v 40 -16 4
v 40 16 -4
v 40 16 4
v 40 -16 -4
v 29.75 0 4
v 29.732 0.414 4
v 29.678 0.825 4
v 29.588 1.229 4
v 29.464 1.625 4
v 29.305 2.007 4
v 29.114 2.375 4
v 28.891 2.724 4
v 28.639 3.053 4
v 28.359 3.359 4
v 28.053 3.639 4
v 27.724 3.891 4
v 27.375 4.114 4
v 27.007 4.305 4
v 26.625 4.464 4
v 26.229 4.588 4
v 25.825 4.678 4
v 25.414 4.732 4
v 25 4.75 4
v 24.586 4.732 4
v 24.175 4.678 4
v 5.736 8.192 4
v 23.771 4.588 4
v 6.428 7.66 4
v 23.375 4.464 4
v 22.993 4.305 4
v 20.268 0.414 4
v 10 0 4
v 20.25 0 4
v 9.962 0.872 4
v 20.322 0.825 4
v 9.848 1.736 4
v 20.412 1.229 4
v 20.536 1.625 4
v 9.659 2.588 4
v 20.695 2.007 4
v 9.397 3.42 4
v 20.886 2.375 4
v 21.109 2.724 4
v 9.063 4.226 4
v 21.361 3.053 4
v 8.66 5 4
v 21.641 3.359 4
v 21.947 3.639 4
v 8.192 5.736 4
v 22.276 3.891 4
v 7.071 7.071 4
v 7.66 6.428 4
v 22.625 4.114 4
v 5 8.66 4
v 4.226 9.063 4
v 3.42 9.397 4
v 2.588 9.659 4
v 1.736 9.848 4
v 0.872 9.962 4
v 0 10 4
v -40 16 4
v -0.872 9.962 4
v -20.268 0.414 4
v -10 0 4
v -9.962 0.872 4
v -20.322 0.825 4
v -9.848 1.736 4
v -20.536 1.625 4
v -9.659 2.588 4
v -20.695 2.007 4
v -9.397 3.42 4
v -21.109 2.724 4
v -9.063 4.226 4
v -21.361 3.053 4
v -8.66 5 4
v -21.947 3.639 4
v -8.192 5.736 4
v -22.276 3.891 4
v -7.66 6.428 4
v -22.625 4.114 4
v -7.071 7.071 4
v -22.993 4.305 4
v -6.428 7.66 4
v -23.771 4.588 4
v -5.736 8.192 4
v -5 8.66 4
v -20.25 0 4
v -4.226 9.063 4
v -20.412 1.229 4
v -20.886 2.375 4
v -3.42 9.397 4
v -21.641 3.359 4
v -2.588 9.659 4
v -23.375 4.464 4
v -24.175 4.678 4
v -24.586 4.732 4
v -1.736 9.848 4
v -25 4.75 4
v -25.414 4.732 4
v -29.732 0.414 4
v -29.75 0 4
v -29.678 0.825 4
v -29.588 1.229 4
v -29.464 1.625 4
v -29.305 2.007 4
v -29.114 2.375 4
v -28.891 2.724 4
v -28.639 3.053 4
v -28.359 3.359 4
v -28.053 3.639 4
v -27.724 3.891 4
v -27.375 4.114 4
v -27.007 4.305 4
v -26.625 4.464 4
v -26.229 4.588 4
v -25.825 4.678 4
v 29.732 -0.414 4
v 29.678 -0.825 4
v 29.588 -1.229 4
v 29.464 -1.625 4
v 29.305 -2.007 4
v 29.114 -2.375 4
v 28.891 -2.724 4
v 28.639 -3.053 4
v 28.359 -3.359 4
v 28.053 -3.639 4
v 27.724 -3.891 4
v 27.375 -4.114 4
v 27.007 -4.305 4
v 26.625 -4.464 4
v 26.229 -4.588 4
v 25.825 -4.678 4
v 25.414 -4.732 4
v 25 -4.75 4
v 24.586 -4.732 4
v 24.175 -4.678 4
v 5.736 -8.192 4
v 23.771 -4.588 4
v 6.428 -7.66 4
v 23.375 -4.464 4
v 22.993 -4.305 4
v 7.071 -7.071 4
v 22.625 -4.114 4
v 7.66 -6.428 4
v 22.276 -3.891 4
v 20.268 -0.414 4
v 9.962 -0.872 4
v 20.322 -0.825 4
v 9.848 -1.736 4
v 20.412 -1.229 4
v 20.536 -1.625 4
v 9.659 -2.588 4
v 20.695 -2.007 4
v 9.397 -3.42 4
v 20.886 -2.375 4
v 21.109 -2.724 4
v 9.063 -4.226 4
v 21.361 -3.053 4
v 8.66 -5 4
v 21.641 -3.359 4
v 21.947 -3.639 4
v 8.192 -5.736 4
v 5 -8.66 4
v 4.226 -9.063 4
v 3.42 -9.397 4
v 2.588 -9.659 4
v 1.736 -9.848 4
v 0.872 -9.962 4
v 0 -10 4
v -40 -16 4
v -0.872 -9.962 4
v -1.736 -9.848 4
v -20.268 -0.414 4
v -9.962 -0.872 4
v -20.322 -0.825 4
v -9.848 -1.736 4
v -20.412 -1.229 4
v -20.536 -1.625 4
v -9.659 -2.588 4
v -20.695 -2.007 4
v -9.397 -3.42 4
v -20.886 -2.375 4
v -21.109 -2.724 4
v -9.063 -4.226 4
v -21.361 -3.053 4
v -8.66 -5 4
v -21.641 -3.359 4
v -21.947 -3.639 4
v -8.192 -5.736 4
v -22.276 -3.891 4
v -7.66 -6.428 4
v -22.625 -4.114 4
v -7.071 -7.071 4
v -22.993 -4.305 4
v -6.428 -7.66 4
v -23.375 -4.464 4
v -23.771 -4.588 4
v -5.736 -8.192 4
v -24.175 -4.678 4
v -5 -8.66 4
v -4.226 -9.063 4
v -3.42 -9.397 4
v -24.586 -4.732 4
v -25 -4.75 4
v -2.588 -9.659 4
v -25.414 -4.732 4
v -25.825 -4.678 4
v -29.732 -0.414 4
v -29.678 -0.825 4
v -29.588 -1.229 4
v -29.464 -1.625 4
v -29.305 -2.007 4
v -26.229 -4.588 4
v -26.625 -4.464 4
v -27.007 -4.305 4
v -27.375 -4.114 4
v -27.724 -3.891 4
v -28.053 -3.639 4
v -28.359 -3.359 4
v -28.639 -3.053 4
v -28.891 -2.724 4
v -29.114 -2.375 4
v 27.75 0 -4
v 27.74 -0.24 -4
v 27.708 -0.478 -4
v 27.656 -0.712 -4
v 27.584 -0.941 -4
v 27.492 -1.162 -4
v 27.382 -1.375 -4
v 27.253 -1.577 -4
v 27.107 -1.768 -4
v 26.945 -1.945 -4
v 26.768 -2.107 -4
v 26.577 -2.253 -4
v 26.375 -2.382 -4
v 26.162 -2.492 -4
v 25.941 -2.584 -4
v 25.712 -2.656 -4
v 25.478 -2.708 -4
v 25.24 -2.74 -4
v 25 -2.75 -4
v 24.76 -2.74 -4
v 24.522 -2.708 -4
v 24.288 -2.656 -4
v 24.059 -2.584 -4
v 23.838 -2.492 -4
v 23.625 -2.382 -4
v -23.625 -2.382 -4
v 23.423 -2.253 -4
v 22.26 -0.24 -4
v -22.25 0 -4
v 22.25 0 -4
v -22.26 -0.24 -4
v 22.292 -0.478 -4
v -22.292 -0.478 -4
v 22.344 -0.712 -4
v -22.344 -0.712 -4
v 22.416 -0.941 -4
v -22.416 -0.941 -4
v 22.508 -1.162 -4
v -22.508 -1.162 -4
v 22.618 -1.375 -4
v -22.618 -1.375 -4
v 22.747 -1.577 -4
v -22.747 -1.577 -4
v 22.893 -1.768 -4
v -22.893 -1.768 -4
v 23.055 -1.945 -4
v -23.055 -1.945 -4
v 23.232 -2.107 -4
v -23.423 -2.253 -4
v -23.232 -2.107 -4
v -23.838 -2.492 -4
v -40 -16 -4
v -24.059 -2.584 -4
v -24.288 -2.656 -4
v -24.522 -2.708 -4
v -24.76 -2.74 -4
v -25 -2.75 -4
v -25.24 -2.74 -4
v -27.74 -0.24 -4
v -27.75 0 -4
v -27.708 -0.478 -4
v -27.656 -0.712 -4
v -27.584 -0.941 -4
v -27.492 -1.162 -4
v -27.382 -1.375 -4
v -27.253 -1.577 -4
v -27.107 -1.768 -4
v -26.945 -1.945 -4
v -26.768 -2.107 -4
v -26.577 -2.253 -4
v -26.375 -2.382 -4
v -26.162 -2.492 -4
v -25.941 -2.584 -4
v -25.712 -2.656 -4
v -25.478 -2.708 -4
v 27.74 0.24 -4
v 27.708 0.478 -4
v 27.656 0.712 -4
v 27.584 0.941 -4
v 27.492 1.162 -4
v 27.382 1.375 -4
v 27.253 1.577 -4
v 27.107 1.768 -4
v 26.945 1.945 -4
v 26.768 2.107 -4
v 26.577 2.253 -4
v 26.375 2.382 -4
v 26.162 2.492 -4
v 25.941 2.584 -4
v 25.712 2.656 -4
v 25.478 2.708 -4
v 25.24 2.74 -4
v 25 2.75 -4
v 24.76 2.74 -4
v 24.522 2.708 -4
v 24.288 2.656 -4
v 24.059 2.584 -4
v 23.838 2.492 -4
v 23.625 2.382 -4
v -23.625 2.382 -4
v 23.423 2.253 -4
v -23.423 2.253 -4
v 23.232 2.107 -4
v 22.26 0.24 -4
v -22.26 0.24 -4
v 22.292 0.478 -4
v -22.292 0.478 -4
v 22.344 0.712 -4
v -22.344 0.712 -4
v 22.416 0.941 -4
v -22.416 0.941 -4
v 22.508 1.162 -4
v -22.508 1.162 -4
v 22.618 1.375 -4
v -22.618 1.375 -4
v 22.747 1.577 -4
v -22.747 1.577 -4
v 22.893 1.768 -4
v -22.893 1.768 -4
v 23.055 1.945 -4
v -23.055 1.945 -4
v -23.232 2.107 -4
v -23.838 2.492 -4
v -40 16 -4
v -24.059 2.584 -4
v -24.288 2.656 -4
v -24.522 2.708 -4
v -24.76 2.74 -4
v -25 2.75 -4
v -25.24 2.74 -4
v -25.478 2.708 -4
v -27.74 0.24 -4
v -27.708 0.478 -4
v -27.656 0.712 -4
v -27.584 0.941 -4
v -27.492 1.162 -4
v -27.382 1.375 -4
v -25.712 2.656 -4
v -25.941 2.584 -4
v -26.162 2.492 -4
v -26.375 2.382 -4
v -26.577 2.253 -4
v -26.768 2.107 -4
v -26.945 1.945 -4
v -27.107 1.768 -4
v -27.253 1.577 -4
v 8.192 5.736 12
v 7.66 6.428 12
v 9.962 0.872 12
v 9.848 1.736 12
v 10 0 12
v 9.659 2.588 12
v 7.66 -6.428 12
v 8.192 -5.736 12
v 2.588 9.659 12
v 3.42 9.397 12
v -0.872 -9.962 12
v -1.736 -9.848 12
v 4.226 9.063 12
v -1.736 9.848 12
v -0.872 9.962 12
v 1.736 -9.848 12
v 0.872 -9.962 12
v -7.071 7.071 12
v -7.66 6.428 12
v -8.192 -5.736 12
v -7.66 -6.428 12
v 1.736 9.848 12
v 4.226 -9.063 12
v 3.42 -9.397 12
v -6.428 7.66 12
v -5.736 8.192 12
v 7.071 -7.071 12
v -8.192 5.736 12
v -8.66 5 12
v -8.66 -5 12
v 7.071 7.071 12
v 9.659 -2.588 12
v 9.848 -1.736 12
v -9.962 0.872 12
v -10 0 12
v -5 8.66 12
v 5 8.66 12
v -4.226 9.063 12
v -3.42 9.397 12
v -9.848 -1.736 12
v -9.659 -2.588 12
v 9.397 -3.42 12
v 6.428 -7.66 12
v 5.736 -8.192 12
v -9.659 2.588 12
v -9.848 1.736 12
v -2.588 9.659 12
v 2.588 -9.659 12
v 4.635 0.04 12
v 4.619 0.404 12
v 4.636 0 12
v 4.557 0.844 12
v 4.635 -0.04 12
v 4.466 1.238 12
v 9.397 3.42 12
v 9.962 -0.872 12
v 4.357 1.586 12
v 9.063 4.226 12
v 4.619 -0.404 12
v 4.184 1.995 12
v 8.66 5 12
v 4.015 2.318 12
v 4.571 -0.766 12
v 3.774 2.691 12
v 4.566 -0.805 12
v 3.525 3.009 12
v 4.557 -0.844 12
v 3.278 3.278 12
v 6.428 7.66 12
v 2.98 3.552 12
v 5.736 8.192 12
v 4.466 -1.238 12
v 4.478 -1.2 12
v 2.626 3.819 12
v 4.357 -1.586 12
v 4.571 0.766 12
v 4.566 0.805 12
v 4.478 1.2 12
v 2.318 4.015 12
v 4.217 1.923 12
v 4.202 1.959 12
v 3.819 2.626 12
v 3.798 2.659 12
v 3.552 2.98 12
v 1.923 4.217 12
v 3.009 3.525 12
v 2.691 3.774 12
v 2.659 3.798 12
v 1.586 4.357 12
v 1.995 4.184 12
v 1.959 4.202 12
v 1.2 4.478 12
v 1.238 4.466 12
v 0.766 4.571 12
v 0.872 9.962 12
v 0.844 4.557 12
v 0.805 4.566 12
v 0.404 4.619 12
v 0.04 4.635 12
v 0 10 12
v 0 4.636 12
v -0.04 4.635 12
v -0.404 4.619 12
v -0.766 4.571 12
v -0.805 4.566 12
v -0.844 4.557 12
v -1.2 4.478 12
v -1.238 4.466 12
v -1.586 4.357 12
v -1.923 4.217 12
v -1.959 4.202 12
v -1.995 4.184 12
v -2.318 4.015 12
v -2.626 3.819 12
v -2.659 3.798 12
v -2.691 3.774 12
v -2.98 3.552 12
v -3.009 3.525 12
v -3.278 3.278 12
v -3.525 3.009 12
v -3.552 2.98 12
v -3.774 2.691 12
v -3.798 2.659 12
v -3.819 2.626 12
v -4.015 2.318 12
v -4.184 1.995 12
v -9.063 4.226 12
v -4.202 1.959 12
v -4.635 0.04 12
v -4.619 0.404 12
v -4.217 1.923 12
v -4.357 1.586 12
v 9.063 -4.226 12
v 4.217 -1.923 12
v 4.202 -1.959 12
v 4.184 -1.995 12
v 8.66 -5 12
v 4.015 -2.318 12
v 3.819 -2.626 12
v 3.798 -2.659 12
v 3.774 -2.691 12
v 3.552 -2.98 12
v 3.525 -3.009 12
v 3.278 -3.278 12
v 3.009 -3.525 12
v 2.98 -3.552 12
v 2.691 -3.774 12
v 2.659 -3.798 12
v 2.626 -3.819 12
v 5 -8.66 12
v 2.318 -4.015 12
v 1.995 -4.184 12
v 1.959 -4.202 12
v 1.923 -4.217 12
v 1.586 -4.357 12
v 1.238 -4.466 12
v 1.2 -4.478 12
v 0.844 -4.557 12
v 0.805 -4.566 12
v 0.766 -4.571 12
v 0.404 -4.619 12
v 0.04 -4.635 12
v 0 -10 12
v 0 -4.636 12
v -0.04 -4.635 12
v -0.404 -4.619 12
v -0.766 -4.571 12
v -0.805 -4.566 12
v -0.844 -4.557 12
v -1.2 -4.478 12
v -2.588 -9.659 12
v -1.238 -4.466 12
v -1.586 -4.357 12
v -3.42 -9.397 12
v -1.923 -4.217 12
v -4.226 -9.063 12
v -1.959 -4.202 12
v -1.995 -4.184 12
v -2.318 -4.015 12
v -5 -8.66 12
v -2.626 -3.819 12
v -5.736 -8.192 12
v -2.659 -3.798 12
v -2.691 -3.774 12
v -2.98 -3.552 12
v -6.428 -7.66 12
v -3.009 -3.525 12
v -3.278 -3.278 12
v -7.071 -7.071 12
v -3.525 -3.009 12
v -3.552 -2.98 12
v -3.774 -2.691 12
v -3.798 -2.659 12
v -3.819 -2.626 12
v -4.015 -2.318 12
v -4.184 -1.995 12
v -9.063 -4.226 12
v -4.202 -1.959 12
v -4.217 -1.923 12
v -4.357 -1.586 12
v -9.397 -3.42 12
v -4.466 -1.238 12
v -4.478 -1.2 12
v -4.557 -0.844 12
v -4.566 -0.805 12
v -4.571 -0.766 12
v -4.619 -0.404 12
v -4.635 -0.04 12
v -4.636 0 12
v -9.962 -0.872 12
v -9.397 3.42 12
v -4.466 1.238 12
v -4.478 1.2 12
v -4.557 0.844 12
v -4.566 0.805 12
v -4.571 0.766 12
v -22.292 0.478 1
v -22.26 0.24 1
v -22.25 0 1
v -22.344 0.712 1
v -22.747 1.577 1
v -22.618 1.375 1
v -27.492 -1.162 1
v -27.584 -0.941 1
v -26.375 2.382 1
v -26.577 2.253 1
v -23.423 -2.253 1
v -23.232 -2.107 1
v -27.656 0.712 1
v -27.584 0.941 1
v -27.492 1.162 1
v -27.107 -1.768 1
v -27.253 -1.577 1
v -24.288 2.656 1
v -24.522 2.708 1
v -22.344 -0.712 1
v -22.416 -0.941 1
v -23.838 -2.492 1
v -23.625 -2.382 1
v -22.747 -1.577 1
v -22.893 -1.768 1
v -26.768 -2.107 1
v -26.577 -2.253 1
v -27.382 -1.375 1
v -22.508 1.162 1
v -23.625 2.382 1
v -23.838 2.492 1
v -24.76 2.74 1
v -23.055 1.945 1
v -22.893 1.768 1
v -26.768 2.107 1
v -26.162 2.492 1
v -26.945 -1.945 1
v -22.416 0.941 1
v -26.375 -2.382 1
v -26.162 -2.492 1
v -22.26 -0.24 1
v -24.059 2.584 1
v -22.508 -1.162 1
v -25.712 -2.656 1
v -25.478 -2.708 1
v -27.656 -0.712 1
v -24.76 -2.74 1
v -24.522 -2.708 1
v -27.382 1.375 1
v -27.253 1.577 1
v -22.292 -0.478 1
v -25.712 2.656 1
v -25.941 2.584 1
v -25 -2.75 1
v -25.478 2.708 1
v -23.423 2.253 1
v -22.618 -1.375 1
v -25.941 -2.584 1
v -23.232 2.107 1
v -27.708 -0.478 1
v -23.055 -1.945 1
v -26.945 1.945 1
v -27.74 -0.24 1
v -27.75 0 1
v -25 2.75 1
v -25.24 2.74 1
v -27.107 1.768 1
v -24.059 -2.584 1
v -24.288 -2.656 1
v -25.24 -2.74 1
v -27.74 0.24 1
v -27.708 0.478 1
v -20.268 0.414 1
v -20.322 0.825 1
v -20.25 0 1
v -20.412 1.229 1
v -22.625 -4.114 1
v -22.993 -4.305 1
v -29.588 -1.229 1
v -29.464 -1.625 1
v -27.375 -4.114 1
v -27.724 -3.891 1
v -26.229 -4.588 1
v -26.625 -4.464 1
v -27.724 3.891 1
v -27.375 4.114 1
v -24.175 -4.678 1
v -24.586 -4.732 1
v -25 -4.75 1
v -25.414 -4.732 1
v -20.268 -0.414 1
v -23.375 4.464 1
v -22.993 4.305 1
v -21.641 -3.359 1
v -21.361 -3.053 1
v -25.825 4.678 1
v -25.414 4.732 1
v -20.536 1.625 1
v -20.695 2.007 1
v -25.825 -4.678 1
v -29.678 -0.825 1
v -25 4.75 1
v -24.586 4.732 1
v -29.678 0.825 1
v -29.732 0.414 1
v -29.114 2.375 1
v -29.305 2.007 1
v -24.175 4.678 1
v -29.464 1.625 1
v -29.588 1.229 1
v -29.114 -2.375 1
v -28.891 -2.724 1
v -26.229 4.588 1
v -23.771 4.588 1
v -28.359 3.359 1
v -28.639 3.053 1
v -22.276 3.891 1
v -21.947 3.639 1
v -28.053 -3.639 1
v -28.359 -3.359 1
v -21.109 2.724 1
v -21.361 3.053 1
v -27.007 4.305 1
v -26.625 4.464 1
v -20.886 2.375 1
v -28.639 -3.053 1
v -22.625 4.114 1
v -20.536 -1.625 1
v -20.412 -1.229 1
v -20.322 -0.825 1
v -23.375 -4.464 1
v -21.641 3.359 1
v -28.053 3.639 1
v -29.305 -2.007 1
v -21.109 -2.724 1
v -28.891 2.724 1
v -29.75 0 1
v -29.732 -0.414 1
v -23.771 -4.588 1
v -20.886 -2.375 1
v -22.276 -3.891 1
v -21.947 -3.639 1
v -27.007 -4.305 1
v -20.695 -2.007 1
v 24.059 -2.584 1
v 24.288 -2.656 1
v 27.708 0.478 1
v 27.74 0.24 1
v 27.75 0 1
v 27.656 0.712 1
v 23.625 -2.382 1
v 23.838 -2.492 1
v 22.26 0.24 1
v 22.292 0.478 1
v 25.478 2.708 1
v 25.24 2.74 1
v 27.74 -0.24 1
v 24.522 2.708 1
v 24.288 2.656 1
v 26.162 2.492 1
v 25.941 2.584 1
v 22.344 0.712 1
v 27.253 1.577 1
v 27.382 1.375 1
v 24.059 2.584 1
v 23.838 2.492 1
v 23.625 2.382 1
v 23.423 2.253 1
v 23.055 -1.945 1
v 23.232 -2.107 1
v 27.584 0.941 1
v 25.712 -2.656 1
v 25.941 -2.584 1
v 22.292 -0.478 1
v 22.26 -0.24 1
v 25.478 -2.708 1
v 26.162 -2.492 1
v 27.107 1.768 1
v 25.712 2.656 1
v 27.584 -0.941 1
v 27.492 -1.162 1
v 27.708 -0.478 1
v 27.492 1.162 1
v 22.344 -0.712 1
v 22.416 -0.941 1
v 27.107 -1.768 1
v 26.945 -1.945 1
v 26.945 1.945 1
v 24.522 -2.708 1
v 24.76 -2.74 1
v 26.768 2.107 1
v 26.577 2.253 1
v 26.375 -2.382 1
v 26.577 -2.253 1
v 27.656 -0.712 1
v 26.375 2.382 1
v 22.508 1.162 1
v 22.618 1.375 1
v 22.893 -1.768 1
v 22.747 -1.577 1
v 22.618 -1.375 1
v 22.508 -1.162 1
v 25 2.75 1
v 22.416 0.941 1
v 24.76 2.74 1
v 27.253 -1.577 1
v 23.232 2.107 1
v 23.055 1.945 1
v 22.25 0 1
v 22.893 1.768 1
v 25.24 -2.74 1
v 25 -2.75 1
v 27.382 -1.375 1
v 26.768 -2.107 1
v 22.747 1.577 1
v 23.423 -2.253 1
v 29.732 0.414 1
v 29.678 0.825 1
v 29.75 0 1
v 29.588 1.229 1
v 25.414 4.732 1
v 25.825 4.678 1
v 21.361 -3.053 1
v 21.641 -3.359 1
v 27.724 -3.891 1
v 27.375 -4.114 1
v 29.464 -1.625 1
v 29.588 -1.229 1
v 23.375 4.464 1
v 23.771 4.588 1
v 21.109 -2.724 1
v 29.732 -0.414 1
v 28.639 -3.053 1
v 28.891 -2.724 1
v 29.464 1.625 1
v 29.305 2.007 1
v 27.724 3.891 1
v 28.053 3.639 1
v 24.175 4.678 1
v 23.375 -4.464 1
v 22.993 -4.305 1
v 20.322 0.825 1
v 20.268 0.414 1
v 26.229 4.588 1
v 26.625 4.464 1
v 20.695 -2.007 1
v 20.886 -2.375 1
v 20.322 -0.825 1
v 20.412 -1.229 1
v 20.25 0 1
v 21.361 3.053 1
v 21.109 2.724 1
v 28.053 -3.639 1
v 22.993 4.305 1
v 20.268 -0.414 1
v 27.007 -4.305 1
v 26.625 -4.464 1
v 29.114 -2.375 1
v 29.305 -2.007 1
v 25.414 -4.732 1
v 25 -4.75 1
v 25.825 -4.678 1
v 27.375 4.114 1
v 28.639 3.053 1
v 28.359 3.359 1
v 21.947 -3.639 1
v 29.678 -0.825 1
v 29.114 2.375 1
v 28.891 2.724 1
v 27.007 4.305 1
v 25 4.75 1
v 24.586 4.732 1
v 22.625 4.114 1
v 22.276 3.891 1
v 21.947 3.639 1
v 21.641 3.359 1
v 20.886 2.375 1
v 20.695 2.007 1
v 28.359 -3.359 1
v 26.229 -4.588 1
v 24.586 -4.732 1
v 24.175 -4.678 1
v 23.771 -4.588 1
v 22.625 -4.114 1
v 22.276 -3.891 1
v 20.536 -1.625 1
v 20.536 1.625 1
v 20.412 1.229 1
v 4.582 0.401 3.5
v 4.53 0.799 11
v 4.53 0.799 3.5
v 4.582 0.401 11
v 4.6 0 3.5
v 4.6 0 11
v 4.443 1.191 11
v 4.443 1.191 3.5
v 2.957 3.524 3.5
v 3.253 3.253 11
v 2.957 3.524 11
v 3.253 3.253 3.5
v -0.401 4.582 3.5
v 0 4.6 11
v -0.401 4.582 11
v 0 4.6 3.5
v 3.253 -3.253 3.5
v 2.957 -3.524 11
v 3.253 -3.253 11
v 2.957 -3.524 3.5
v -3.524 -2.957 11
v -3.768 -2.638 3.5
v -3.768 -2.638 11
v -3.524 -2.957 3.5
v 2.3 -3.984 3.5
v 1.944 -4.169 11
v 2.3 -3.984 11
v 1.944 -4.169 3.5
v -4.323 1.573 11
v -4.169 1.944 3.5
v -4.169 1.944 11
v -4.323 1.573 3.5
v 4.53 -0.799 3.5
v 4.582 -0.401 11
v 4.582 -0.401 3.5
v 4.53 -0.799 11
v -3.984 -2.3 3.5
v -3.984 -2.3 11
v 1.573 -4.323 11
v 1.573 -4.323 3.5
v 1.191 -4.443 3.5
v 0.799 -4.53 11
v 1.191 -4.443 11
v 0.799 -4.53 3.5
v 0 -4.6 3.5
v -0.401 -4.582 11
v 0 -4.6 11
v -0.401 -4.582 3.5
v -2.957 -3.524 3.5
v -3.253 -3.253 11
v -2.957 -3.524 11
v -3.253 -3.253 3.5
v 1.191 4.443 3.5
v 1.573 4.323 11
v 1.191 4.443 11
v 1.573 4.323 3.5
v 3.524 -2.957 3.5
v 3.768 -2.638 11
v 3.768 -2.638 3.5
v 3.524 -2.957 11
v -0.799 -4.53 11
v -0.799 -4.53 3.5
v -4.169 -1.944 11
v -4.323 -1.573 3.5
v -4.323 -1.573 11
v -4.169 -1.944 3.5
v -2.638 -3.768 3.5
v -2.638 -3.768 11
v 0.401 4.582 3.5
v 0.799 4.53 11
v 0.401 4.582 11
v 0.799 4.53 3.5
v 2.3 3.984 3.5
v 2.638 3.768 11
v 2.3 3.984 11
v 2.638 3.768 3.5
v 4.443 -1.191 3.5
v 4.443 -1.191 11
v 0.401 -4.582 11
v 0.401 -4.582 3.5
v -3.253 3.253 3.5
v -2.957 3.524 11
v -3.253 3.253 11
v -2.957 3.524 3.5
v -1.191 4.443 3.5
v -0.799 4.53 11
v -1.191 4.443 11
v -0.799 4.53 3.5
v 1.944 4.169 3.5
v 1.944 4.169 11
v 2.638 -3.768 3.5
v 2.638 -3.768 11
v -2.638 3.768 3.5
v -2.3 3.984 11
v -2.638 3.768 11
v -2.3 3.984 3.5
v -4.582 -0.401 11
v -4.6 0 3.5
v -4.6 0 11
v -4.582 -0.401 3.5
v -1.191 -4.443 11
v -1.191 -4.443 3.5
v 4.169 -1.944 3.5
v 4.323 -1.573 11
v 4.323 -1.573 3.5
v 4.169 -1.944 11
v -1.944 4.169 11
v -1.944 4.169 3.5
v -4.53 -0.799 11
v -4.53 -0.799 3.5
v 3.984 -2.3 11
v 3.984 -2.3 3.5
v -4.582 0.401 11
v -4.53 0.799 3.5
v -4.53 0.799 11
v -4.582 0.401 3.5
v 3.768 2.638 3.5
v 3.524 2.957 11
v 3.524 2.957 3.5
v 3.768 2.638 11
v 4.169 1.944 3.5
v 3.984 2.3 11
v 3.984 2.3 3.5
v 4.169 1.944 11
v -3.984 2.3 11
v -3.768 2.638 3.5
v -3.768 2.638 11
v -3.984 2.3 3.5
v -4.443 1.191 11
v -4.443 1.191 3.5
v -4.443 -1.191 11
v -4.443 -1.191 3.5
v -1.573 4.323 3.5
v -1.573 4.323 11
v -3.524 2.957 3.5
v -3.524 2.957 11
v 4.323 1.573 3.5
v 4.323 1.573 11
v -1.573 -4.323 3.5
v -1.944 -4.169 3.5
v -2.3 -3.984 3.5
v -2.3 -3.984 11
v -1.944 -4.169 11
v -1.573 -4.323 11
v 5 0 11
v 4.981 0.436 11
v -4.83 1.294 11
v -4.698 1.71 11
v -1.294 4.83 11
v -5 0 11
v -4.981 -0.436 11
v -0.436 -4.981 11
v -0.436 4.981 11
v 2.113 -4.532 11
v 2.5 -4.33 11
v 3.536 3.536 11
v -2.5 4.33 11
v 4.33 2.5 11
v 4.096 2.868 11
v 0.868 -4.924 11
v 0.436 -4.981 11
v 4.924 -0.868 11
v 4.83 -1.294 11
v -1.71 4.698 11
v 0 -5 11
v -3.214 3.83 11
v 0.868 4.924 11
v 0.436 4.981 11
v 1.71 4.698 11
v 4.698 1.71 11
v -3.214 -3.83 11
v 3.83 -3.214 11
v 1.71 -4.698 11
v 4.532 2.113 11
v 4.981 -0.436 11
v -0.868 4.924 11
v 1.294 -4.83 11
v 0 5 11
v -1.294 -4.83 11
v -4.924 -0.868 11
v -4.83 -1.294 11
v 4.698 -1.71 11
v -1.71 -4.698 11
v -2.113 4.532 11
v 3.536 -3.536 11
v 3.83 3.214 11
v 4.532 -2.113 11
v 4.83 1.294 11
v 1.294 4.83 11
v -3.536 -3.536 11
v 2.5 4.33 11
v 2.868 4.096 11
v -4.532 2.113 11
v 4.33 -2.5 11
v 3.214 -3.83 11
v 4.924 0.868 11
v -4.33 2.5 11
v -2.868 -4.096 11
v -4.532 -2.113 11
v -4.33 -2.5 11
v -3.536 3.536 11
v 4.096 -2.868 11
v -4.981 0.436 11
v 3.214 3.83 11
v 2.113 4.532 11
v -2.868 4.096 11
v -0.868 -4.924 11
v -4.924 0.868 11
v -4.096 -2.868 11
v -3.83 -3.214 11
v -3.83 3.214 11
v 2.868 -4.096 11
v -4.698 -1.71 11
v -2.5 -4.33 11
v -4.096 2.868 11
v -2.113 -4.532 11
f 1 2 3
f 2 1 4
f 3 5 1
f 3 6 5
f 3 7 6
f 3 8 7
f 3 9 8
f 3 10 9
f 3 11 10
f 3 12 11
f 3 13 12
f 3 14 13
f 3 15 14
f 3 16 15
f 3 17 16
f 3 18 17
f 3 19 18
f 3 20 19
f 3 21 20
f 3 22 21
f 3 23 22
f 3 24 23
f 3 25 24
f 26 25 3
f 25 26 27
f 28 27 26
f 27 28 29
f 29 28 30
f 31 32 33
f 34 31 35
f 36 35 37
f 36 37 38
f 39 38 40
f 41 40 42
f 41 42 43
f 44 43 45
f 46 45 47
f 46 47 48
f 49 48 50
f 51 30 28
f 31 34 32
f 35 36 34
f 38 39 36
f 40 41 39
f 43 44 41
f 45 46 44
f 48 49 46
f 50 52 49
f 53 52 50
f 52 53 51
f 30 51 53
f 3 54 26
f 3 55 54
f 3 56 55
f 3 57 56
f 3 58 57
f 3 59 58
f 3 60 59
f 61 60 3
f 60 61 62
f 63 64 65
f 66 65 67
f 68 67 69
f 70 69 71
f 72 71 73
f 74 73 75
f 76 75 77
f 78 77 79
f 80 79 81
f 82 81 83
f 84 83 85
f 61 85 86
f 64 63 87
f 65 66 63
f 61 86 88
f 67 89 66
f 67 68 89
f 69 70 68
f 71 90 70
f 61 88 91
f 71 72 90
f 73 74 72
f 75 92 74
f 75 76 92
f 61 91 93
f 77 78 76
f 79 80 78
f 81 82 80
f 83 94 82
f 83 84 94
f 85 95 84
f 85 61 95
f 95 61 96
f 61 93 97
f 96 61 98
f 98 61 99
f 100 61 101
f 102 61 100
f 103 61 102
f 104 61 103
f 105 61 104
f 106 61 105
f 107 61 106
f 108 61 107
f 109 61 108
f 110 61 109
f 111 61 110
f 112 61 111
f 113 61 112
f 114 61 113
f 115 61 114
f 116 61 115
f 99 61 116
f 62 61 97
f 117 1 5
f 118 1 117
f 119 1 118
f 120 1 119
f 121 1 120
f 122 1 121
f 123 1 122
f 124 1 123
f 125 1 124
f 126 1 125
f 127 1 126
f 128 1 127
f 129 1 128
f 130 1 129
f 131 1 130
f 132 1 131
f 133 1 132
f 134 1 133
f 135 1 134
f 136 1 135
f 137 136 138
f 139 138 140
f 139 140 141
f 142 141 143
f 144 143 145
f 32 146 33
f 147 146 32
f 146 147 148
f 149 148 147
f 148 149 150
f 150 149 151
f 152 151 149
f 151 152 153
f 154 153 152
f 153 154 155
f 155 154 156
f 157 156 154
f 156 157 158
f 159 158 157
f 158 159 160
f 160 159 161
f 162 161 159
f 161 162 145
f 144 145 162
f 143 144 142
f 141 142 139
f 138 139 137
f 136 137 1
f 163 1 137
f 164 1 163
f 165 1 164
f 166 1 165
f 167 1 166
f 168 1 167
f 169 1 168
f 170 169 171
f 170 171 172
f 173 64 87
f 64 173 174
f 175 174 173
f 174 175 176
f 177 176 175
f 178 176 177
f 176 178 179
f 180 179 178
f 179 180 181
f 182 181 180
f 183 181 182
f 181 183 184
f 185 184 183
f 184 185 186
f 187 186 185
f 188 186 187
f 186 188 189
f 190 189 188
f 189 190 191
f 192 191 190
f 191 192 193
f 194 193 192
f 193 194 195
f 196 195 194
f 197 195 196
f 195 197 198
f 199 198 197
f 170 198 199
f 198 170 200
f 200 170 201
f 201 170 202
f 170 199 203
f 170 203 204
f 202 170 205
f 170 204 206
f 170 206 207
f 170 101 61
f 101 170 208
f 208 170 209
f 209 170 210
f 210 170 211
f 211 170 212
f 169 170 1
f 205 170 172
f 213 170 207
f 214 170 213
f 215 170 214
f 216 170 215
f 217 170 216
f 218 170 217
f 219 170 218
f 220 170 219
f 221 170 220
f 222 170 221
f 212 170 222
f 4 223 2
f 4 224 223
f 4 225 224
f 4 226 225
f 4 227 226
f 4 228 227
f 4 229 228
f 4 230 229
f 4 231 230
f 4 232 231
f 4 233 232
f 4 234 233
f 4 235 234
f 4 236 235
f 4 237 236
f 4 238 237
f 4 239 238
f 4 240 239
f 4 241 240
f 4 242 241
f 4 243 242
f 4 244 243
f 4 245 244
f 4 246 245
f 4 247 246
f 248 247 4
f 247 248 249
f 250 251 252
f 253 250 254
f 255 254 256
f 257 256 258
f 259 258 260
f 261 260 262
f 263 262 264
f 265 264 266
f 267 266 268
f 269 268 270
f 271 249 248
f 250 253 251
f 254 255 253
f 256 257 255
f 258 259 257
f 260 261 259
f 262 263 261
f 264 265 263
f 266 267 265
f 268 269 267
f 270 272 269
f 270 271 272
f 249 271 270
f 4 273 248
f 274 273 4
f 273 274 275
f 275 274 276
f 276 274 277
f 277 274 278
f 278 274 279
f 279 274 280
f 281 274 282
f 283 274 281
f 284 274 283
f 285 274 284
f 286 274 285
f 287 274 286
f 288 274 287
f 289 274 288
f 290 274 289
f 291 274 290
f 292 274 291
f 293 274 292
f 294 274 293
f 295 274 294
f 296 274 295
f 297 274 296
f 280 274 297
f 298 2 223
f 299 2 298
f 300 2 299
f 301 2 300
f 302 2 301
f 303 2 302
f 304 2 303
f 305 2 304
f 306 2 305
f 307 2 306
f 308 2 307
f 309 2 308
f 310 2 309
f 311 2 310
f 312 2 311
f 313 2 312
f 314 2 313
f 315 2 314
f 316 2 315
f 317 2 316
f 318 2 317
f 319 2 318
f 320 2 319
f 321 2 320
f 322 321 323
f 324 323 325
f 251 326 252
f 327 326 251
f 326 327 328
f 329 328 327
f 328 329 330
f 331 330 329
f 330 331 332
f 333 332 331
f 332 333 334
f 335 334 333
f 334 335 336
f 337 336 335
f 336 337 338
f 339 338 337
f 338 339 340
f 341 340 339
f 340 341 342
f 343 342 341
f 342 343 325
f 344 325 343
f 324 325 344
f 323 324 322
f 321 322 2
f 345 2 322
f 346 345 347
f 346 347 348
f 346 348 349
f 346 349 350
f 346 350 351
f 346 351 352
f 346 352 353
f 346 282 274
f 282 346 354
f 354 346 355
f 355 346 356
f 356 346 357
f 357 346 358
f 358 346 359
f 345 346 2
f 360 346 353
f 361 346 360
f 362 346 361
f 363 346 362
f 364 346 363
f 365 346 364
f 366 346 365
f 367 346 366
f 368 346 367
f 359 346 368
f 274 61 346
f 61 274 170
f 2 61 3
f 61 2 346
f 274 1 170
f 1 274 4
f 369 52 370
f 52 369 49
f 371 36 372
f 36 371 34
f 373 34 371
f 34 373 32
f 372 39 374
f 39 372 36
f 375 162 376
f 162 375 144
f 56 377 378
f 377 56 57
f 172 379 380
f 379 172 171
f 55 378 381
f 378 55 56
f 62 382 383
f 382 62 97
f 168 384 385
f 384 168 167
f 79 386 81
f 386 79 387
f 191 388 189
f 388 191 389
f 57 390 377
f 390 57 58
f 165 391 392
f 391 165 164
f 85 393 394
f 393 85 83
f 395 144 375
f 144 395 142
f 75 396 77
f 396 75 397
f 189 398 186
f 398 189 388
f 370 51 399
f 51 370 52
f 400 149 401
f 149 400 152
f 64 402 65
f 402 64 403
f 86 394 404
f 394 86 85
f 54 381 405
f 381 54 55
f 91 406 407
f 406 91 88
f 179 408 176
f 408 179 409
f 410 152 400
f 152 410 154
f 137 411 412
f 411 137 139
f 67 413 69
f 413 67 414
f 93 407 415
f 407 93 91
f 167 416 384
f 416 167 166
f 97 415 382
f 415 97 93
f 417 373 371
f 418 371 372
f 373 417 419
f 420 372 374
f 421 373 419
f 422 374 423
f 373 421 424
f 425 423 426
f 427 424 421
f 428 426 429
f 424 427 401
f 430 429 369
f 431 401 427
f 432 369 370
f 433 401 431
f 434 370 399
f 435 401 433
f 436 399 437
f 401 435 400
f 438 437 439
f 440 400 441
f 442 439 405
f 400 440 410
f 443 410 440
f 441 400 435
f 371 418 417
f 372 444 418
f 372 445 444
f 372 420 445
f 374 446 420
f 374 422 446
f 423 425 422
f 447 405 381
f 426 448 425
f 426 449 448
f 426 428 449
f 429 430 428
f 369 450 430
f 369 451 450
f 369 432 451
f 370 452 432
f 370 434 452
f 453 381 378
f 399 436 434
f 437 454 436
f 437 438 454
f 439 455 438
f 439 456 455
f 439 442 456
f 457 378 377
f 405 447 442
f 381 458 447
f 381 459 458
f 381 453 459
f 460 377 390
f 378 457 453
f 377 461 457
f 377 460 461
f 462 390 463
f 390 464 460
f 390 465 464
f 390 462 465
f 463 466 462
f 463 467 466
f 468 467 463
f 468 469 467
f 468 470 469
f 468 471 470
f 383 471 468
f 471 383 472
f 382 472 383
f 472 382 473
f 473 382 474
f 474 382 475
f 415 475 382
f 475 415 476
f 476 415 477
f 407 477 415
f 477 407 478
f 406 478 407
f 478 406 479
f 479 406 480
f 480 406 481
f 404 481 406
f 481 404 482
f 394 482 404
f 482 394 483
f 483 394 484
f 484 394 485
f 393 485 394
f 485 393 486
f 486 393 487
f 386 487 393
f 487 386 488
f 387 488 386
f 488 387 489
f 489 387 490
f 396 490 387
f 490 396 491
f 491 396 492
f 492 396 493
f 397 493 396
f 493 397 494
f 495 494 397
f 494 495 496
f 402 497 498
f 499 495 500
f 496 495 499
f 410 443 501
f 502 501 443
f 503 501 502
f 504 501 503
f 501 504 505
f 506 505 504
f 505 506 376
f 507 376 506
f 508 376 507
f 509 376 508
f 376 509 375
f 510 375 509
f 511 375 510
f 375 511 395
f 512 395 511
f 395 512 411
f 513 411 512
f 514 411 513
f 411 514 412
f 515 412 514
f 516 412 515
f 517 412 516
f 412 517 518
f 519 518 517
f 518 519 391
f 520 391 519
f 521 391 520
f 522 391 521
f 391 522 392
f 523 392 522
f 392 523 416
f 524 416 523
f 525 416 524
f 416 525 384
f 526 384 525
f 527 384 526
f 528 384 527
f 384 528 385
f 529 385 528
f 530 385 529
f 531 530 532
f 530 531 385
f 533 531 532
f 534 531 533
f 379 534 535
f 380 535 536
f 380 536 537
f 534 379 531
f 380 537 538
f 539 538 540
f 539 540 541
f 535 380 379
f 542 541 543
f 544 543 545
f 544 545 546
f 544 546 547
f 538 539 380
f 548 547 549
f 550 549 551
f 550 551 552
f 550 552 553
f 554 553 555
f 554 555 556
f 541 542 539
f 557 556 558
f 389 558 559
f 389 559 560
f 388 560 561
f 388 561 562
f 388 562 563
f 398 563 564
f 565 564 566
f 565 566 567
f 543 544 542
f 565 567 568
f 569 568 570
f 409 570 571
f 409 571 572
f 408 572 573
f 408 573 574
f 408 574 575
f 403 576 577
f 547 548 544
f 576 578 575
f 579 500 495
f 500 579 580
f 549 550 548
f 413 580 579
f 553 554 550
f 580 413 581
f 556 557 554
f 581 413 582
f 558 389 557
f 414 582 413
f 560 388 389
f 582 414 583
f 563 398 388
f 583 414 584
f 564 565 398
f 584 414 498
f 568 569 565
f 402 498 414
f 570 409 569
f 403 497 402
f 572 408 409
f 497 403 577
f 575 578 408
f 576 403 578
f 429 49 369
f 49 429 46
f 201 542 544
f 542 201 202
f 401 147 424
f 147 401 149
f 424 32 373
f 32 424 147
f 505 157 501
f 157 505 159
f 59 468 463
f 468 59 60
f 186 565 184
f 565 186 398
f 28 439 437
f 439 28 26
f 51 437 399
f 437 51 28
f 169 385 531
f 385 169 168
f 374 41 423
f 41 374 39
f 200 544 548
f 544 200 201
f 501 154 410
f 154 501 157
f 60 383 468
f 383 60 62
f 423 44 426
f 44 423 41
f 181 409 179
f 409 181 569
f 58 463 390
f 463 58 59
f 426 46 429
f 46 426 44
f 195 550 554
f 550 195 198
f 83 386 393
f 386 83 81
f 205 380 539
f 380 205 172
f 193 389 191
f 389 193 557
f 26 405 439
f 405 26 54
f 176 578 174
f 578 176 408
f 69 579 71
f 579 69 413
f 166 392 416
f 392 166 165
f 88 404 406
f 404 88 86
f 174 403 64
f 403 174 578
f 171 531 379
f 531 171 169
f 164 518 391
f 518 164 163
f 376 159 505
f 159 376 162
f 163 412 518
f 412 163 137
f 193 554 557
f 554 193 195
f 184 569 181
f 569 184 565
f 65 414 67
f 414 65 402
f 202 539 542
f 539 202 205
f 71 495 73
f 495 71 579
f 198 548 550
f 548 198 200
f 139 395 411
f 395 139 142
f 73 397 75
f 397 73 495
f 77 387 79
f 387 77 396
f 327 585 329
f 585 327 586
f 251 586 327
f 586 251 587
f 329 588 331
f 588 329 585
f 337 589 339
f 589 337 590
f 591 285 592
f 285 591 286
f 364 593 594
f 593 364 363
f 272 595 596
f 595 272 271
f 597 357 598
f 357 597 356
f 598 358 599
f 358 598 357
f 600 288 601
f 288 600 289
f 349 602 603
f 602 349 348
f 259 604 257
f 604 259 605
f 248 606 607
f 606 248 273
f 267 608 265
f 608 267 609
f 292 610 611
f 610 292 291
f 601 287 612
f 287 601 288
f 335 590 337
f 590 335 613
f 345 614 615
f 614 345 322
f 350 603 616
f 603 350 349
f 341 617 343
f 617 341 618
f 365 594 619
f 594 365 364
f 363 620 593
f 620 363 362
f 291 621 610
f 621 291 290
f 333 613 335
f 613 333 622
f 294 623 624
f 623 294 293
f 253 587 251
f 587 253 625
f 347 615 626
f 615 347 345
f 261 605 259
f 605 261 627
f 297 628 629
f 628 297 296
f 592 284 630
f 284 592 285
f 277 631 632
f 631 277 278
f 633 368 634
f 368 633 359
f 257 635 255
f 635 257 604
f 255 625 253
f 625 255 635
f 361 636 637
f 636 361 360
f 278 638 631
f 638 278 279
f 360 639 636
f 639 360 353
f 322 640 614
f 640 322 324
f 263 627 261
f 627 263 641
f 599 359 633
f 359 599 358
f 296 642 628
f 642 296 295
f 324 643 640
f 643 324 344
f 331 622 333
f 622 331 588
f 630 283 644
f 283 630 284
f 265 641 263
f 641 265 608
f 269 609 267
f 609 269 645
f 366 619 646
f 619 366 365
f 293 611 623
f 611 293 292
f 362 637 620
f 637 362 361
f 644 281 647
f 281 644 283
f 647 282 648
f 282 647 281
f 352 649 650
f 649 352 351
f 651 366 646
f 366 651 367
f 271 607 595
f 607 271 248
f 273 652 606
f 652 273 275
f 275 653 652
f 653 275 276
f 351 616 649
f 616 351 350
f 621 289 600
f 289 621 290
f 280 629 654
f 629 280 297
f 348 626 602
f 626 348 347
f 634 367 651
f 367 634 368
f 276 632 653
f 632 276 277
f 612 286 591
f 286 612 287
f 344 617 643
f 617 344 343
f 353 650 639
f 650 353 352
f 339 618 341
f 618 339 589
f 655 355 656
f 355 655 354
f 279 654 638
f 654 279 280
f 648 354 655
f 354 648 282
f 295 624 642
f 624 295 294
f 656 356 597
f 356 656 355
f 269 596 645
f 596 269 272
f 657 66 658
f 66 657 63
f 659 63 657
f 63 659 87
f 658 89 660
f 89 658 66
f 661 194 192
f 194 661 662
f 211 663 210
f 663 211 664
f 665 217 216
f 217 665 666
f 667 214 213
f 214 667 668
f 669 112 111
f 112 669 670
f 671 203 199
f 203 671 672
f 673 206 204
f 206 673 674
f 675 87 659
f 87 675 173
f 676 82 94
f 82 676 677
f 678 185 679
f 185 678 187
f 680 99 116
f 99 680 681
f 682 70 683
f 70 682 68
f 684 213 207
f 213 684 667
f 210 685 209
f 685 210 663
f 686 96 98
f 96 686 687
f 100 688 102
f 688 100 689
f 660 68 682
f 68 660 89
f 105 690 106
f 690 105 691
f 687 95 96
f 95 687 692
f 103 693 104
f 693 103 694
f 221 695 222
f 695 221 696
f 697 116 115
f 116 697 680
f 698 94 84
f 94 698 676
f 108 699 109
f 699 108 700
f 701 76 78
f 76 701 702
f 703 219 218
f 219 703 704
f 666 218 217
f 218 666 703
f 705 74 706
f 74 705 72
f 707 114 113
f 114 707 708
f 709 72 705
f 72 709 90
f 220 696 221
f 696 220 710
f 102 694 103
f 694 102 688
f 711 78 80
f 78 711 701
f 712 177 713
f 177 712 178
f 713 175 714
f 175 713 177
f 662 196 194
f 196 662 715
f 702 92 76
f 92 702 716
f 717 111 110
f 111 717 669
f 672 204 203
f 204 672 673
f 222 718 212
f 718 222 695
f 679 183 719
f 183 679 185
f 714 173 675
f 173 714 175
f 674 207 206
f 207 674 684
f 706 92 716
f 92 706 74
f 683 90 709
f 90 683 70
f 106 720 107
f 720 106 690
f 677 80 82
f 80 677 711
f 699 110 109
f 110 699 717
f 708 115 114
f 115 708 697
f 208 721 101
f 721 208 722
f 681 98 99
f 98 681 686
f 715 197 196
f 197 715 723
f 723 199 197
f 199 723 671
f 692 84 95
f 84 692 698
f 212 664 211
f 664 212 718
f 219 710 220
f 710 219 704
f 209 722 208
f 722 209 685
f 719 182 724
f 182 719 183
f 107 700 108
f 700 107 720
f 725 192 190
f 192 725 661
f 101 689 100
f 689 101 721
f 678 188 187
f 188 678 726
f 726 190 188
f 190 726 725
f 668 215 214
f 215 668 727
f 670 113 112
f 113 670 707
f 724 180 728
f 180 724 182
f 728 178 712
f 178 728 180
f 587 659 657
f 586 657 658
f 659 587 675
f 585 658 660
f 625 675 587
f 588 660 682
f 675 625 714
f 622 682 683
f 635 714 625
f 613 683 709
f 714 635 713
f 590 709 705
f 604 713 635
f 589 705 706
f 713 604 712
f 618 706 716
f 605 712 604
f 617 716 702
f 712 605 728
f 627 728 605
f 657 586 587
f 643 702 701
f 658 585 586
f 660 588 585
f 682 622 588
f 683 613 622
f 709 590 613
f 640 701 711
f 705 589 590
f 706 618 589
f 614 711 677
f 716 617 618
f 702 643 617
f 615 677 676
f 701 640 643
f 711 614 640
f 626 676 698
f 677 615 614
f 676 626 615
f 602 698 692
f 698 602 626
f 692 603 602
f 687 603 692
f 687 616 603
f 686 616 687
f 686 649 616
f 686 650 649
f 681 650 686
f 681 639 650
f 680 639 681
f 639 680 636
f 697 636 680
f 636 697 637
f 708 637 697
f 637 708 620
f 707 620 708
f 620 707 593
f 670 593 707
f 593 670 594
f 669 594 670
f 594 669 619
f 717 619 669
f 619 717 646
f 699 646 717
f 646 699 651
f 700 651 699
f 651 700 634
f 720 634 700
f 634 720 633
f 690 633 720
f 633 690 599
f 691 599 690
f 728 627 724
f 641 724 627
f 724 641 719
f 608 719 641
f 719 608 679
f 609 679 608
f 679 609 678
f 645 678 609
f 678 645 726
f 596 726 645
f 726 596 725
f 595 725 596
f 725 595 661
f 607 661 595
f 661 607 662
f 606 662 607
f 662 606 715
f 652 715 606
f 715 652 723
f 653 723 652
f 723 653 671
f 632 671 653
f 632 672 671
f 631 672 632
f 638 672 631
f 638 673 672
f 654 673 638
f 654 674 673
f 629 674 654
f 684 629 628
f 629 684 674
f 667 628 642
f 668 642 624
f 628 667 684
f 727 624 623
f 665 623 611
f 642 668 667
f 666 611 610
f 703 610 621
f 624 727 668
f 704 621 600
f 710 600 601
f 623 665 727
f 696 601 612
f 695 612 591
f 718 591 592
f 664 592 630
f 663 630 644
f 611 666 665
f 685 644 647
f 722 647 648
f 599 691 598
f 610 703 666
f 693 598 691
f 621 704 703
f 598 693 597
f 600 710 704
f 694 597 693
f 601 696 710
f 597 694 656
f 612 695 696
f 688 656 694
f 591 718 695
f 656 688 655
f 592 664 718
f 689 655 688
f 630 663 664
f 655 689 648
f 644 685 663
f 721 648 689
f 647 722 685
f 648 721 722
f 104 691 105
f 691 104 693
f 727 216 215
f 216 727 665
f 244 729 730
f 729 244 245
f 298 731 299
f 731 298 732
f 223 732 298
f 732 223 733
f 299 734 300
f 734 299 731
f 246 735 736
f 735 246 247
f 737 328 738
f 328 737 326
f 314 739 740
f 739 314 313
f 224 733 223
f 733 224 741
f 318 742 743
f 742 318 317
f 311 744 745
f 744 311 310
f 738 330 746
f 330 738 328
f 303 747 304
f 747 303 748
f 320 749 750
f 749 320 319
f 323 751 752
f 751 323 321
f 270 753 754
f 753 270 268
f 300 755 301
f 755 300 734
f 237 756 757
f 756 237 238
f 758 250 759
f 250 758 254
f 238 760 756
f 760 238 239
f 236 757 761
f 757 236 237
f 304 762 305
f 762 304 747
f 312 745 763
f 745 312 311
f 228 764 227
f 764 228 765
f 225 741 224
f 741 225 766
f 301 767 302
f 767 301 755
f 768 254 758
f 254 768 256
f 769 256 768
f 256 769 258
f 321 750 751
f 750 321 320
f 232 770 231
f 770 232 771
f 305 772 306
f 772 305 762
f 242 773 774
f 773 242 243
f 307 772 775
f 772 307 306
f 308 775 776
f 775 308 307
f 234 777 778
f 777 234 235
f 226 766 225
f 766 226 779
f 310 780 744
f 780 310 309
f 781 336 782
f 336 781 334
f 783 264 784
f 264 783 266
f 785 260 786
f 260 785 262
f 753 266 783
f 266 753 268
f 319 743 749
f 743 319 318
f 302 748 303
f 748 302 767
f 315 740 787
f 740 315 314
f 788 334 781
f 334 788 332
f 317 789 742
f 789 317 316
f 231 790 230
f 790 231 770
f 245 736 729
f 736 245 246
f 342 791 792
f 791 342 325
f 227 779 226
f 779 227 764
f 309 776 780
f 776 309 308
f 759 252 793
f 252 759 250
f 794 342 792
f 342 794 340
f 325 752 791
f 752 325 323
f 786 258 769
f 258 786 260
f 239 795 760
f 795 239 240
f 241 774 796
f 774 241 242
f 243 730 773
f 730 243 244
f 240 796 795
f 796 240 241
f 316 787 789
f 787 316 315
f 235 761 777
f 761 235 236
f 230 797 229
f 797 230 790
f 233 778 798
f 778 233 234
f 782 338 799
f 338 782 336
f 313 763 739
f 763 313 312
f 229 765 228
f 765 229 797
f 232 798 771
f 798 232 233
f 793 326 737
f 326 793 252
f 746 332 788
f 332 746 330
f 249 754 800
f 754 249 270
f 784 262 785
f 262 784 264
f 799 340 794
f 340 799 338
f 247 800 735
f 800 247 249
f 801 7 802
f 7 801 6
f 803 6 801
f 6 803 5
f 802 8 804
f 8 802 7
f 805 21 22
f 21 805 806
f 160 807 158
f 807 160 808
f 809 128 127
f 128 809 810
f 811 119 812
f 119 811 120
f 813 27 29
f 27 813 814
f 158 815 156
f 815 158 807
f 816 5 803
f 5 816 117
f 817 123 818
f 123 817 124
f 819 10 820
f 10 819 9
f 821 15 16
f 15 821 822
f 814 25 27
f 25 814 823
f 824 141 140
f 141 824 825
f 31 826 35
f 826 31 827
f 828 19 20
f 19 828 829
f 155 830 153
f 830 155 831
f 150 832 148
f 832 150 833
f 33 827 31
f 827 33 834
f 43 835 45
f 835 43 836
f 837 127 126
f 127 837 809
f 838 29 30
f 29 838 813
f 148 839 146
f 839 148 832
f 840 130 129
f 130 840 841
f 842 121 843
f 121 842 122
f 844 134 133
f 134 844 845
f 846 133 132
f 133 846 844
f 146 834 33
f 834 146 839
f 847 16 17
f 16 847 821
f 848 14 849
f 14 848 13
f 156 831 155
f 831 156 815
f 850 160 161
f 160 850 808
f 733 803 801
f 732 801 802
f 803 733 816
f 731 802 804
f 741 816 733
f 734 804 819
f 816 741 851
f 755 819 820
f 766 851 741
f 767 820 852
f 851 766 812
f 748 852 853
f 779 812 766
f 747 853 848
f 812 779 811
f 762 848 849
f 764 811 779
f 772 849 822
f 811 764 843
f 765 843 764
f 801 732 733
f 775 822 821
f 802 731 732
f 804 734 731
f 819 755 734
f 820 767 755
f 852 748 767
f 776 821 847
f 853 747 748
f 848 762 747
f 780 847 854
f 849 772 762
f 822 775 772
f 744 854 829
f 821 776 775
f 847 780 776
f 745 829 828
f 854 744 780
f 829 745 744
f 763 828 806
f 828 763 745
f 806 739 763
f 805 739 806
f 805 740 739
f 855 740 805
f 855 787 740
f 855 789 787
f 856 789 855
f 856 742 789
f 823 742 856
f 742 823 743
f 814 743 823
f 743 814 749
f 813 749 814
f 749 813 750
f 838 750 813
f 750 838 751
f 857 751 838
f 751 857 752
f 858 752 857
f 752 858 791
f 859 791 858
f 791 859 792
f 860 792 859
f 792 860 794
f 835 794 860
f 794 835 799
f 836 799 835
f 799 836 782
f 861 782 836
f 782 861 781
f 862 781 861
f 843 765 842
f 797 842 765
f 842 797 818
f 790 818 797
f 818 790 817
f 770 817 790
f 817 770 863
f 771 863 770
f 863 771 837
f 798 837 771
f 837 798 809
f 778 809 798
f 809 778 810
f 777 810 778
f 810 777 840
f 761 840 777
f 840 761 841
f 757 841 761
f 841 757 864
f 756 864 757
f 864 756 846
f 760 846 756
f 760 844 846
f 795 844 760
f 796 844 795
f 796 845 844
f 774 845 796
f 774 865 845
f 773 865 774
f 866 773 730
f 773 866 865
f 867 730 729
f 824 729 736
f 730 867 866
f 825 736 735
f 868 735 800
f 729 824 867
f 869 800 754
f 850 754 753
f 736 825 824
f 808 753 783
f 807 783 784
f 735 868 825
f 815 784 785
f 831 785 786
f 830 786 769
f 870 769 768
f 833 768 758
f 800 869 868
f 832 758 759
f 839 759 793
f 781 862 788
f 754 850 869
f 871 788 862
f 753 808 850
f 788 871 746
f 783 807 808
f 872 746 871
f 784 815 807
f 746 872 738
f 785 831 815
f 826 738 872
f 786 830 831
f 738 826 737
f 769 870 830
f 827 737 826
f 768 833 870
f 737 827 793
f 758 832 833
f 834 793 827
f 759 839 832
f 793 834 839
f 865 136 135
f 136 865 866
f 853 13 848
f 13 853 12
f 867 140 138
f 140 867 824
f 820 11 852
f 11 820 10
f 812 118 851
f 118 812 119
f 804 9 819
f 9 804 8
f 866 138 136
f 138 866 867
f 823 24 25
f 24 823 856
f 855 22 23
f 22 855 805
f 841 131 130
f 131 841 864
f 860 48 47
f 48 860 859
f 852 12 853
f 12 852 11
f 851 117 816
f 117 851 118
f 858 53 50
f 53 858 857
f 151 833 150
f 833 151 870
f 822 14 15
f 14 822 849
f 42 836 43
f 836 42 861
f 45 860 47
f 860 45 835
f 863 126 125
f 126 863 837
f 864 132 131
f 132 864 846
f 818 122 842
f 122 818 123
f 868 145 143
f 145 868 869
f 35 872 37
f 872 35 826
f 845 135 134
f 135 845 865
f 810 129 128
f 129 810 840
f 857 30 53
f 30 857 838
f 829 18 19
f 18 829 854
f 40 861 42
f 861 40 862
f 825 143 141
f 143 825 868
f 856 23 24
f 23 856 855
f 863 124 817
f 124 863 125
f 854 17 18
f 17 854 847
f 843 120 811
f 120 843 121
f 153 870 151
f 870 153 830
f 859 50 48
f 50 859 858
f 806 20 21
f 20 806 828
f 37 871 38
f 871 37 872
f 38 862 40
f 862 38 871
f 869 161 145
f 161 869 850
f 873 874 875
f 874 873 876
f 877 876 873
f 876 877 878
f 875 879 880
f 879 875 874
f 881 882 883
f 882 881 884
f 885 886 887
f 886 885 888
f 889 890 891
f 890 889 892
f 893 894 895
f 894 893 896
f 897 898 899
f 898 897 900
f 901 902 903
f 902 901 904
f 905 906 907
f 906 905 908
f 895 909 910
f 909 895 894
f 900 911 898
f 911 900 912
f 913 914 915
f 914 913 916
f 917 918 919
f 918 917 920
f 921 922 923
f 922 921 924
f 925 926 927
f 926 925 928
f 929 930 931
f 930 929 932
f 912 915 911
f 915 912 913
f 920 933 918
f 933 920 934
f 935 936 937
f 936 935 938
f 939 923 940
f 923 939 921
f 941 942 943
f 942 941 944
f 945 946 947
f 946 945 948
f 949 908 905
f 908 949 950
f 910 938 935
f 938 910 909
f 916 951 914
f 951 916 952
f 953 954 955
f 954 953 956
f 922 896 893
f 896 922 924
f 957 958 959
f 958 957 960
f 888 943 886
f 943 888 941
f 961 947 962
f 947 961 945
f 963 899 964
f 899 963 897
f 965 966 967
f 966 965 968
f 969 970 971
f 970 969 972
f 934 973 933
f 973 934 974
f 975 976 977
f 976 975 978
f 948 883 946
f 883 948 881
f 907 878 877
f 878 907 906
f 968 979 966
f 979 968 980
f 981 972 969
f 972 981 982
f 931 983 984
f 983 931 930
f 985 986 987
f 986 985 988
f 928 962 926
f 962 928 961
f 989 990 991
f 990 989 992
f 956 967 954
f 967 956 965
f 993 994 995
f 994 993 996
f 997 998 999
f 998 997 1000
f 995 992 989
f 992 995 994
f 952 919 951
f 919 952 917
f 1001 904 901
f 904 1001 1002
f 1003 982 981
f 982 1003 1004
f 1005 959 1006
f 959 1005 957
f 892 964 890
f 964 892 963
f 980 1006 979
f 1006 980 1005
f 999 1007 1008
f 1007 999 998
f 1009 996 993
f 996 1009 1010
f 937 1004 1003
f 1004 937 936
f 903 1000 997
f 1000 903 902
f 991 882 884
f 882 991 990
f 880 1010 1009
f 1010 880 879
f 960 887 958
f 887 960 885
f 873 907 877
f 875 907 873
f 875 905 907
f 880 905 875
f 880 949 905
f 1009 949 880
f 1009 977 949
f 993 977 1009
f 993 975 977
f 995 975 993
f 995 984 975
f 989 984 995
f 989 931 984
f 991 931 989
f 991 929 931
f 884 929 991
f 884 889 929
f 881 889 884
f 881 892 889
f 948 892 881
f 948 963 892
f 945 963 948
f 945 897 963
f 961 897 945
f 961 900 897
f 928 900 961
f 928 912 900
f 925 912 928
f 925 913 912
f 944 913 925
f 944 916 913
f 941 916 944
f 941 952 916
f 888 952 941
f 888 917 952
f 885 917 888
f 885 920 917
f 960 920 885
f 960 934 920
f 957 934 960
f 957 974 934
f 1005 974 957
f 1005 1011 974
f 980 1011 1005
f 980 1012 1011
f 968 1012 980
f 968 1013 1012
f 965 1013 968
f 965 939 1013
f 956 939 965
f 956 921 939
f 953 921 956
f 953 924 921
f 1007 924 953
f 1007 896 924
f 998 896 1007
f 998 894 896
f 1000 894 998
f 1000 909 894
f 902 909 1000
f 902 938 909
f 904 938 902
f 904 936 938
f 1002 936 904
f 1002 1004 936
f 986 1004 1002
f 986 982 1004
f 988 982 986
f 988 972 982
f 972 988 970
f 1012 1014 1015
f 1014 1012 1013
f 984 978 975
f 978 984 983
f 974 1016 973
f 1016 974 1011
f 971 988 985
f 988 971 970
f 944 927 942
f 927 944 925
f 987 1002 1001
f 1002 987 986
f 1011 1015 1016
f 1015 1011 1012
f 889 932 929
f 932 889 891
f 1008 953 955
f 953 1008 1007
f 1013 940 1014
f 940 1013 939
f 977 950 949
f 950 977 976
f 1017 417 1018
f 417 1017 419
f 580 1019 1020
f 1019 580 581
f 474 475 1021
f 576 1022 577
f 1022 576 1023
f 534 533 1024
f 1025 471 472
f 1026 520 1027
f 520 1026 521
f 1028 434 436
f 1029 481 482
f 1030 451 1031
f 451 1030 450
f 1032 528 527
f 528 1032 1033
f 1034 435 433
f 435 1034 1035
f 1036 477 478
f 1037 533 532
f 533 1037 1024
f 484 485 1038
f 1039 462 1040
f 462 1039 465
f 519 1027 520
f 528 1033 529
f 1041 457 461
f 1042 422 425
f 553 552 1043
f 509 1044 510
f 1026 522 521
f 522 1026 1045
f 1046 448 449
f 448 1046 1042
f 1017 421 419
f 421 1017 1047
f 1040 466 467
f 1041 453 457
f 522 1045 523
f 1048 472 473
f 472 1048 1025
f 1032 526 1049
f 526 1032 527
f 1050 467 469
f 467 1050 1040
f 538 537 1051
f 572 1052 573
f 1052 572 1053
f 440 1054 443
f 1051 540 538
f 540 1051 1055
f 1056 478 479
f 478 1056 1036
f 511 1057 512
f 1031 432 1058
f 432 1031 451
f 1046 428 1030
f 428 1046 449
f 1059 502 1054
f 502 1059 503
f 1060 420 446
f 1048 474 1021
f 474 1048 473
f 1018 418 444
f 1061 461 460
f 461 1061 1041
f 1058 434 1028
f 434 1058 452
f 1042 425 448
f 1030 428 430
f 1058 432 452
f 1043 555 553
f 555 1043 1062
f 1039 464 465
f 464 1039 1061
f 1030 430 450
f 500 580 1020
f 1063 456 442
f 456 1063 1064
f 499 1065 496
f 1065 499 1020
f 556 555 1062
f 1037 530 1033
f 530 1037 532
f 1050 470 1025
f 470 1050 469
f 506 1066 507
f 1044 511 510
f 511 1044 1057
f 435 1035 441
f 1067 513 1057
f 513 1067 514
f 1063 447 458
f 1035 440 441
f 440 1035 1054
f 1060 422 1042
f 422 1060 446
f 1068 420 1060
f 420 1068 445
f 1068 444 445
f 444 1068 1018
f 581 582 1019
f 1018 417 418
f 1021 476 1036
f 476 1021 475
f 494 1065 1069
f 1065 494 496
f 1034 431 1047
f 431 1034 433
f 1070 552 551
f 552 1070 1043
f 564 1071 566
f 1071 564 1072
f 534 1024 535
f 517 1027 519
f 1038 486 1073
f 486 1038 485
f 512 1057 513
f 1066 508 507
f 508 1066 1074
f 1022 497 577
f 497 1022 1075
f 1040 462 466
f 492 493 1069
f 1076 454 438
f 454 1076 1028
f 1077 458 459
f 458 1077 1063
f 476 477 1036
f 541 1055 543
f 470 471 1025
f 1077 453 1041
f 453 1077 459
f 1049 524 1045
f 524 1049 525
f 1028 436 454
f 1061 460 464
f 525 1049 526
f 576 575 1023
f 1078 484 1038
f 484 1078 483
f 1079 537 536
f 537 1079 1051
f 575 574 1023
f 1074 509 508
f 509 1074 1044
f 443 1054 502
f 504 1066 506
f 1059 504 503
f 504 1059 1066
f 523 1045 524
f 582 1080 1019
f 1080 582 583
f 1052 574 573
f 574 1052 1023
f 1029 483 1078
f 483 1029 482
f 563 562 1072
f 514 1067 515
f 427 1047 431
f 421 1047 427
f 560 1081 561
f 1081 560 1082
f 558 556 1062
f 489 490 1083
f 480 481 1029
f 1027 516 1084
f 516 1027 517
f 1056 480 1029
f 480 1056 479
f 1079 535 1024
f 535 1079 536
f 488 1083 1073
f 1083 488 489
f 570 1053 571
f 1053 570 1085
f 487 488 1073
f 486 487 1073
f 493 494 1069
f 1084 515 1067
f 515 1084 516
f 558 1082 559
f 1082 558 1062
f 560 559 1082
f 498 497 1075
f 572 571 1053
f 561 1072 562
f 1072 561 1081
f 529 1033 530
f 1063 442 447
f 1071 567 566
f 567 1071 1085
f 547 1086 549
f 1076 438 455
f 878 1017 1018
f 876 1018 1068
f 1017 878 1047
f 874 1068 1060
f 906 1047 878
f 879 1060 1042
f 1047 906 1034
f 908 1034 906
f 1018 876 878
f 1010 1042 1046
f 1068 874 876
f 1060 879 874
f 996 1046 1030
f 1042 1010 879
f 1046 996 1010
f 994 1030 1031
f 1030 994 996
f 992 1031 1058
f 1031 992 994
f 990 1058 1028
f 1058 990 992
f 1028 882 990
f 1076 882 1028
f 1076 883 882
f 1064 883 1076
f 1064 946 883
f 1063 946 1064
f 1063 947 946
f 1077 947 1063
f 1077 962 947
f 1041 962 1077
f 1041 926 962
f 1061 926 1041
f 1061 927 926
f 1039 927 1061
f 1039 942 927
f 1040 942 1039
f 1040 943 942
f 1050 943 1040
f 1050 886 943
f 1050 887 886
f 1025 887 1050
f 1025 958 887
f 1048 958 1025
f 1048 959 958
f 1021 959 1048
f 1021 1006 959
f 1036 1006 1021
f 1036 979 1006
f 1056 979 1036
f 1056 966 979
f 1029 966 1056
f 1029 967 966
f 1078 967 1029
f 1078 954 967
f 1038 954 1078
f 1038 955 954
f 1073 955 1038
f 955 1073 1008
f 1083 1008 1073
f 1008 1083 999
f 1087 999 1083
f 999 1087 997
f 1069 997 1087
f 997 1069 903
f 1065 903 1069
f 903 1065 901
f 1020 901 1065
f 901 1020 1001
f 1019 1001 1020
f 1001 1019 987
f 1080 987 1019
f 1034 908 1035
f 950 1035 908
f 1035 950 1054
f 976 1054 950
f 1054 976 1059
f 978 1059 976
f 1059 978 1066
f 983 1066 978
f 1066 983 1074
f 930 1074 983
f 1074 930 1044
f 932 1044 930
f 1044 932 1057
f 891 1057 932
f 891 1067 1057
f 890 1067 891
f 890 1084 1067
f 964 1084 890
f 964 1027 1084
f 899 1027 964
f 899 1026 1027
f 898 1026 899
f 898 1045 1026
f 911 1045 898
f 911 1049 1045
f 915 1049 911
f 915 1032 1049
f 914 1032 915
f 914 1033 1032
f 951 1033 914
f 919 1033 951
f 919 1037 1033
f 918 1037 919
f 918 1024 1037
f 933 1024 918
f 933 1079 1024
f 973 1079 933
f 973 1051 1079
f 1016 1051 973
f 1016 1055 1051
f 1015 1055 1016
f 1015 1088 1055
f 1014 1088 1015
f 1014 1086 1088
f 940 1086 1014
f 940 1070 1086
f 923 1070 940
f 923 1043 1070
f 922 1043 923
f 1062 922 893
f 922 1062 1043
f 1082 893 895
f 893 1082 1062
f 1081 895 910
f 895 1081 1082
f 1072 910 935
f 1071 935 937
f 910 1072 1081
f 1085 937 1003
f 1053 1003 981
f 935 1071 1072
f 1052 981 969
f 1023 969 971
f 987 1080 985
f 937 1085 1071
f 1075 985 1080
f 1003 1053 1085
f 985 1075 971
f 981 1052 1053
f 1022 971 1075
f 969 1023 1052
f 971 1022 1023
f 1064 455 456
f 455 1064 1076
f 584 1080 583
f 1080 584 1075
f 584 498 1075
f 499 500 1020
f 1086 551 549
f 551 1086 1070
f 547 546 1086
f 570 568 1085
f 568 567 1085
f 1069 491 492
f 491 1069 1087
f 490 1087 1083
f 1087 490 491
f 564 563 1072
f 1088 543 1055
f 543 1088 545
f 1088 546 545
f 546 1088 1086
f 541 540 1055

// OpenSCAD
// AymanBuilds Modular Filming Station — 2020 extrusion accessory/light mount
// Print flat with the insert boss facing UP. Use a metal 1/4-20 stud or compact arm.
$fn = 72;

plate_x = 80;
plate_y = 32;
plate_t = 8;
rail_hole_d = 5.5;
rail_hole_spacing = 50;
button_head_cbore_d = 9.5;
button_head_cbore_depth = 3.0;
boss_d = 20;
boss_h = 8;
insert_hole_d = 9.2;        // verify against chosen 1/4-20 heat-set insert
insert_hole_depth = 8.5;

difference() {
  union() {
    cube([plate_x, plate_y, plate_t], center=true);
    translate([0,0,plate_t/2]) cylinder(d=boss_d, h=boss_h);
  }
  for (x = [-rail_hole_spacing/2, rail_hole_spacing/2]) {
    translate([x,0,-plate_t/2-0.1]) cylinder(d=rail_hole_d, h=plate_t+0.2);
    translate([x,0,plate_t/2-button_head_cbore_depth])
      cylinder(d=button_head_cbore_d, h=button_head_cbore_depth+0.2);
  }
  translate([0,0,plate_t/2+boss_h-insert_hole_depth])
    cylinder(d=insert_hole_d, h=insert_hole_depth+0.2);
  translate([0,0,plate_t/2+boss_h-1.0])
    cylinder(d1=insert_hole_d+0.8, d2=insert_hole_d, h=1.1);
}
